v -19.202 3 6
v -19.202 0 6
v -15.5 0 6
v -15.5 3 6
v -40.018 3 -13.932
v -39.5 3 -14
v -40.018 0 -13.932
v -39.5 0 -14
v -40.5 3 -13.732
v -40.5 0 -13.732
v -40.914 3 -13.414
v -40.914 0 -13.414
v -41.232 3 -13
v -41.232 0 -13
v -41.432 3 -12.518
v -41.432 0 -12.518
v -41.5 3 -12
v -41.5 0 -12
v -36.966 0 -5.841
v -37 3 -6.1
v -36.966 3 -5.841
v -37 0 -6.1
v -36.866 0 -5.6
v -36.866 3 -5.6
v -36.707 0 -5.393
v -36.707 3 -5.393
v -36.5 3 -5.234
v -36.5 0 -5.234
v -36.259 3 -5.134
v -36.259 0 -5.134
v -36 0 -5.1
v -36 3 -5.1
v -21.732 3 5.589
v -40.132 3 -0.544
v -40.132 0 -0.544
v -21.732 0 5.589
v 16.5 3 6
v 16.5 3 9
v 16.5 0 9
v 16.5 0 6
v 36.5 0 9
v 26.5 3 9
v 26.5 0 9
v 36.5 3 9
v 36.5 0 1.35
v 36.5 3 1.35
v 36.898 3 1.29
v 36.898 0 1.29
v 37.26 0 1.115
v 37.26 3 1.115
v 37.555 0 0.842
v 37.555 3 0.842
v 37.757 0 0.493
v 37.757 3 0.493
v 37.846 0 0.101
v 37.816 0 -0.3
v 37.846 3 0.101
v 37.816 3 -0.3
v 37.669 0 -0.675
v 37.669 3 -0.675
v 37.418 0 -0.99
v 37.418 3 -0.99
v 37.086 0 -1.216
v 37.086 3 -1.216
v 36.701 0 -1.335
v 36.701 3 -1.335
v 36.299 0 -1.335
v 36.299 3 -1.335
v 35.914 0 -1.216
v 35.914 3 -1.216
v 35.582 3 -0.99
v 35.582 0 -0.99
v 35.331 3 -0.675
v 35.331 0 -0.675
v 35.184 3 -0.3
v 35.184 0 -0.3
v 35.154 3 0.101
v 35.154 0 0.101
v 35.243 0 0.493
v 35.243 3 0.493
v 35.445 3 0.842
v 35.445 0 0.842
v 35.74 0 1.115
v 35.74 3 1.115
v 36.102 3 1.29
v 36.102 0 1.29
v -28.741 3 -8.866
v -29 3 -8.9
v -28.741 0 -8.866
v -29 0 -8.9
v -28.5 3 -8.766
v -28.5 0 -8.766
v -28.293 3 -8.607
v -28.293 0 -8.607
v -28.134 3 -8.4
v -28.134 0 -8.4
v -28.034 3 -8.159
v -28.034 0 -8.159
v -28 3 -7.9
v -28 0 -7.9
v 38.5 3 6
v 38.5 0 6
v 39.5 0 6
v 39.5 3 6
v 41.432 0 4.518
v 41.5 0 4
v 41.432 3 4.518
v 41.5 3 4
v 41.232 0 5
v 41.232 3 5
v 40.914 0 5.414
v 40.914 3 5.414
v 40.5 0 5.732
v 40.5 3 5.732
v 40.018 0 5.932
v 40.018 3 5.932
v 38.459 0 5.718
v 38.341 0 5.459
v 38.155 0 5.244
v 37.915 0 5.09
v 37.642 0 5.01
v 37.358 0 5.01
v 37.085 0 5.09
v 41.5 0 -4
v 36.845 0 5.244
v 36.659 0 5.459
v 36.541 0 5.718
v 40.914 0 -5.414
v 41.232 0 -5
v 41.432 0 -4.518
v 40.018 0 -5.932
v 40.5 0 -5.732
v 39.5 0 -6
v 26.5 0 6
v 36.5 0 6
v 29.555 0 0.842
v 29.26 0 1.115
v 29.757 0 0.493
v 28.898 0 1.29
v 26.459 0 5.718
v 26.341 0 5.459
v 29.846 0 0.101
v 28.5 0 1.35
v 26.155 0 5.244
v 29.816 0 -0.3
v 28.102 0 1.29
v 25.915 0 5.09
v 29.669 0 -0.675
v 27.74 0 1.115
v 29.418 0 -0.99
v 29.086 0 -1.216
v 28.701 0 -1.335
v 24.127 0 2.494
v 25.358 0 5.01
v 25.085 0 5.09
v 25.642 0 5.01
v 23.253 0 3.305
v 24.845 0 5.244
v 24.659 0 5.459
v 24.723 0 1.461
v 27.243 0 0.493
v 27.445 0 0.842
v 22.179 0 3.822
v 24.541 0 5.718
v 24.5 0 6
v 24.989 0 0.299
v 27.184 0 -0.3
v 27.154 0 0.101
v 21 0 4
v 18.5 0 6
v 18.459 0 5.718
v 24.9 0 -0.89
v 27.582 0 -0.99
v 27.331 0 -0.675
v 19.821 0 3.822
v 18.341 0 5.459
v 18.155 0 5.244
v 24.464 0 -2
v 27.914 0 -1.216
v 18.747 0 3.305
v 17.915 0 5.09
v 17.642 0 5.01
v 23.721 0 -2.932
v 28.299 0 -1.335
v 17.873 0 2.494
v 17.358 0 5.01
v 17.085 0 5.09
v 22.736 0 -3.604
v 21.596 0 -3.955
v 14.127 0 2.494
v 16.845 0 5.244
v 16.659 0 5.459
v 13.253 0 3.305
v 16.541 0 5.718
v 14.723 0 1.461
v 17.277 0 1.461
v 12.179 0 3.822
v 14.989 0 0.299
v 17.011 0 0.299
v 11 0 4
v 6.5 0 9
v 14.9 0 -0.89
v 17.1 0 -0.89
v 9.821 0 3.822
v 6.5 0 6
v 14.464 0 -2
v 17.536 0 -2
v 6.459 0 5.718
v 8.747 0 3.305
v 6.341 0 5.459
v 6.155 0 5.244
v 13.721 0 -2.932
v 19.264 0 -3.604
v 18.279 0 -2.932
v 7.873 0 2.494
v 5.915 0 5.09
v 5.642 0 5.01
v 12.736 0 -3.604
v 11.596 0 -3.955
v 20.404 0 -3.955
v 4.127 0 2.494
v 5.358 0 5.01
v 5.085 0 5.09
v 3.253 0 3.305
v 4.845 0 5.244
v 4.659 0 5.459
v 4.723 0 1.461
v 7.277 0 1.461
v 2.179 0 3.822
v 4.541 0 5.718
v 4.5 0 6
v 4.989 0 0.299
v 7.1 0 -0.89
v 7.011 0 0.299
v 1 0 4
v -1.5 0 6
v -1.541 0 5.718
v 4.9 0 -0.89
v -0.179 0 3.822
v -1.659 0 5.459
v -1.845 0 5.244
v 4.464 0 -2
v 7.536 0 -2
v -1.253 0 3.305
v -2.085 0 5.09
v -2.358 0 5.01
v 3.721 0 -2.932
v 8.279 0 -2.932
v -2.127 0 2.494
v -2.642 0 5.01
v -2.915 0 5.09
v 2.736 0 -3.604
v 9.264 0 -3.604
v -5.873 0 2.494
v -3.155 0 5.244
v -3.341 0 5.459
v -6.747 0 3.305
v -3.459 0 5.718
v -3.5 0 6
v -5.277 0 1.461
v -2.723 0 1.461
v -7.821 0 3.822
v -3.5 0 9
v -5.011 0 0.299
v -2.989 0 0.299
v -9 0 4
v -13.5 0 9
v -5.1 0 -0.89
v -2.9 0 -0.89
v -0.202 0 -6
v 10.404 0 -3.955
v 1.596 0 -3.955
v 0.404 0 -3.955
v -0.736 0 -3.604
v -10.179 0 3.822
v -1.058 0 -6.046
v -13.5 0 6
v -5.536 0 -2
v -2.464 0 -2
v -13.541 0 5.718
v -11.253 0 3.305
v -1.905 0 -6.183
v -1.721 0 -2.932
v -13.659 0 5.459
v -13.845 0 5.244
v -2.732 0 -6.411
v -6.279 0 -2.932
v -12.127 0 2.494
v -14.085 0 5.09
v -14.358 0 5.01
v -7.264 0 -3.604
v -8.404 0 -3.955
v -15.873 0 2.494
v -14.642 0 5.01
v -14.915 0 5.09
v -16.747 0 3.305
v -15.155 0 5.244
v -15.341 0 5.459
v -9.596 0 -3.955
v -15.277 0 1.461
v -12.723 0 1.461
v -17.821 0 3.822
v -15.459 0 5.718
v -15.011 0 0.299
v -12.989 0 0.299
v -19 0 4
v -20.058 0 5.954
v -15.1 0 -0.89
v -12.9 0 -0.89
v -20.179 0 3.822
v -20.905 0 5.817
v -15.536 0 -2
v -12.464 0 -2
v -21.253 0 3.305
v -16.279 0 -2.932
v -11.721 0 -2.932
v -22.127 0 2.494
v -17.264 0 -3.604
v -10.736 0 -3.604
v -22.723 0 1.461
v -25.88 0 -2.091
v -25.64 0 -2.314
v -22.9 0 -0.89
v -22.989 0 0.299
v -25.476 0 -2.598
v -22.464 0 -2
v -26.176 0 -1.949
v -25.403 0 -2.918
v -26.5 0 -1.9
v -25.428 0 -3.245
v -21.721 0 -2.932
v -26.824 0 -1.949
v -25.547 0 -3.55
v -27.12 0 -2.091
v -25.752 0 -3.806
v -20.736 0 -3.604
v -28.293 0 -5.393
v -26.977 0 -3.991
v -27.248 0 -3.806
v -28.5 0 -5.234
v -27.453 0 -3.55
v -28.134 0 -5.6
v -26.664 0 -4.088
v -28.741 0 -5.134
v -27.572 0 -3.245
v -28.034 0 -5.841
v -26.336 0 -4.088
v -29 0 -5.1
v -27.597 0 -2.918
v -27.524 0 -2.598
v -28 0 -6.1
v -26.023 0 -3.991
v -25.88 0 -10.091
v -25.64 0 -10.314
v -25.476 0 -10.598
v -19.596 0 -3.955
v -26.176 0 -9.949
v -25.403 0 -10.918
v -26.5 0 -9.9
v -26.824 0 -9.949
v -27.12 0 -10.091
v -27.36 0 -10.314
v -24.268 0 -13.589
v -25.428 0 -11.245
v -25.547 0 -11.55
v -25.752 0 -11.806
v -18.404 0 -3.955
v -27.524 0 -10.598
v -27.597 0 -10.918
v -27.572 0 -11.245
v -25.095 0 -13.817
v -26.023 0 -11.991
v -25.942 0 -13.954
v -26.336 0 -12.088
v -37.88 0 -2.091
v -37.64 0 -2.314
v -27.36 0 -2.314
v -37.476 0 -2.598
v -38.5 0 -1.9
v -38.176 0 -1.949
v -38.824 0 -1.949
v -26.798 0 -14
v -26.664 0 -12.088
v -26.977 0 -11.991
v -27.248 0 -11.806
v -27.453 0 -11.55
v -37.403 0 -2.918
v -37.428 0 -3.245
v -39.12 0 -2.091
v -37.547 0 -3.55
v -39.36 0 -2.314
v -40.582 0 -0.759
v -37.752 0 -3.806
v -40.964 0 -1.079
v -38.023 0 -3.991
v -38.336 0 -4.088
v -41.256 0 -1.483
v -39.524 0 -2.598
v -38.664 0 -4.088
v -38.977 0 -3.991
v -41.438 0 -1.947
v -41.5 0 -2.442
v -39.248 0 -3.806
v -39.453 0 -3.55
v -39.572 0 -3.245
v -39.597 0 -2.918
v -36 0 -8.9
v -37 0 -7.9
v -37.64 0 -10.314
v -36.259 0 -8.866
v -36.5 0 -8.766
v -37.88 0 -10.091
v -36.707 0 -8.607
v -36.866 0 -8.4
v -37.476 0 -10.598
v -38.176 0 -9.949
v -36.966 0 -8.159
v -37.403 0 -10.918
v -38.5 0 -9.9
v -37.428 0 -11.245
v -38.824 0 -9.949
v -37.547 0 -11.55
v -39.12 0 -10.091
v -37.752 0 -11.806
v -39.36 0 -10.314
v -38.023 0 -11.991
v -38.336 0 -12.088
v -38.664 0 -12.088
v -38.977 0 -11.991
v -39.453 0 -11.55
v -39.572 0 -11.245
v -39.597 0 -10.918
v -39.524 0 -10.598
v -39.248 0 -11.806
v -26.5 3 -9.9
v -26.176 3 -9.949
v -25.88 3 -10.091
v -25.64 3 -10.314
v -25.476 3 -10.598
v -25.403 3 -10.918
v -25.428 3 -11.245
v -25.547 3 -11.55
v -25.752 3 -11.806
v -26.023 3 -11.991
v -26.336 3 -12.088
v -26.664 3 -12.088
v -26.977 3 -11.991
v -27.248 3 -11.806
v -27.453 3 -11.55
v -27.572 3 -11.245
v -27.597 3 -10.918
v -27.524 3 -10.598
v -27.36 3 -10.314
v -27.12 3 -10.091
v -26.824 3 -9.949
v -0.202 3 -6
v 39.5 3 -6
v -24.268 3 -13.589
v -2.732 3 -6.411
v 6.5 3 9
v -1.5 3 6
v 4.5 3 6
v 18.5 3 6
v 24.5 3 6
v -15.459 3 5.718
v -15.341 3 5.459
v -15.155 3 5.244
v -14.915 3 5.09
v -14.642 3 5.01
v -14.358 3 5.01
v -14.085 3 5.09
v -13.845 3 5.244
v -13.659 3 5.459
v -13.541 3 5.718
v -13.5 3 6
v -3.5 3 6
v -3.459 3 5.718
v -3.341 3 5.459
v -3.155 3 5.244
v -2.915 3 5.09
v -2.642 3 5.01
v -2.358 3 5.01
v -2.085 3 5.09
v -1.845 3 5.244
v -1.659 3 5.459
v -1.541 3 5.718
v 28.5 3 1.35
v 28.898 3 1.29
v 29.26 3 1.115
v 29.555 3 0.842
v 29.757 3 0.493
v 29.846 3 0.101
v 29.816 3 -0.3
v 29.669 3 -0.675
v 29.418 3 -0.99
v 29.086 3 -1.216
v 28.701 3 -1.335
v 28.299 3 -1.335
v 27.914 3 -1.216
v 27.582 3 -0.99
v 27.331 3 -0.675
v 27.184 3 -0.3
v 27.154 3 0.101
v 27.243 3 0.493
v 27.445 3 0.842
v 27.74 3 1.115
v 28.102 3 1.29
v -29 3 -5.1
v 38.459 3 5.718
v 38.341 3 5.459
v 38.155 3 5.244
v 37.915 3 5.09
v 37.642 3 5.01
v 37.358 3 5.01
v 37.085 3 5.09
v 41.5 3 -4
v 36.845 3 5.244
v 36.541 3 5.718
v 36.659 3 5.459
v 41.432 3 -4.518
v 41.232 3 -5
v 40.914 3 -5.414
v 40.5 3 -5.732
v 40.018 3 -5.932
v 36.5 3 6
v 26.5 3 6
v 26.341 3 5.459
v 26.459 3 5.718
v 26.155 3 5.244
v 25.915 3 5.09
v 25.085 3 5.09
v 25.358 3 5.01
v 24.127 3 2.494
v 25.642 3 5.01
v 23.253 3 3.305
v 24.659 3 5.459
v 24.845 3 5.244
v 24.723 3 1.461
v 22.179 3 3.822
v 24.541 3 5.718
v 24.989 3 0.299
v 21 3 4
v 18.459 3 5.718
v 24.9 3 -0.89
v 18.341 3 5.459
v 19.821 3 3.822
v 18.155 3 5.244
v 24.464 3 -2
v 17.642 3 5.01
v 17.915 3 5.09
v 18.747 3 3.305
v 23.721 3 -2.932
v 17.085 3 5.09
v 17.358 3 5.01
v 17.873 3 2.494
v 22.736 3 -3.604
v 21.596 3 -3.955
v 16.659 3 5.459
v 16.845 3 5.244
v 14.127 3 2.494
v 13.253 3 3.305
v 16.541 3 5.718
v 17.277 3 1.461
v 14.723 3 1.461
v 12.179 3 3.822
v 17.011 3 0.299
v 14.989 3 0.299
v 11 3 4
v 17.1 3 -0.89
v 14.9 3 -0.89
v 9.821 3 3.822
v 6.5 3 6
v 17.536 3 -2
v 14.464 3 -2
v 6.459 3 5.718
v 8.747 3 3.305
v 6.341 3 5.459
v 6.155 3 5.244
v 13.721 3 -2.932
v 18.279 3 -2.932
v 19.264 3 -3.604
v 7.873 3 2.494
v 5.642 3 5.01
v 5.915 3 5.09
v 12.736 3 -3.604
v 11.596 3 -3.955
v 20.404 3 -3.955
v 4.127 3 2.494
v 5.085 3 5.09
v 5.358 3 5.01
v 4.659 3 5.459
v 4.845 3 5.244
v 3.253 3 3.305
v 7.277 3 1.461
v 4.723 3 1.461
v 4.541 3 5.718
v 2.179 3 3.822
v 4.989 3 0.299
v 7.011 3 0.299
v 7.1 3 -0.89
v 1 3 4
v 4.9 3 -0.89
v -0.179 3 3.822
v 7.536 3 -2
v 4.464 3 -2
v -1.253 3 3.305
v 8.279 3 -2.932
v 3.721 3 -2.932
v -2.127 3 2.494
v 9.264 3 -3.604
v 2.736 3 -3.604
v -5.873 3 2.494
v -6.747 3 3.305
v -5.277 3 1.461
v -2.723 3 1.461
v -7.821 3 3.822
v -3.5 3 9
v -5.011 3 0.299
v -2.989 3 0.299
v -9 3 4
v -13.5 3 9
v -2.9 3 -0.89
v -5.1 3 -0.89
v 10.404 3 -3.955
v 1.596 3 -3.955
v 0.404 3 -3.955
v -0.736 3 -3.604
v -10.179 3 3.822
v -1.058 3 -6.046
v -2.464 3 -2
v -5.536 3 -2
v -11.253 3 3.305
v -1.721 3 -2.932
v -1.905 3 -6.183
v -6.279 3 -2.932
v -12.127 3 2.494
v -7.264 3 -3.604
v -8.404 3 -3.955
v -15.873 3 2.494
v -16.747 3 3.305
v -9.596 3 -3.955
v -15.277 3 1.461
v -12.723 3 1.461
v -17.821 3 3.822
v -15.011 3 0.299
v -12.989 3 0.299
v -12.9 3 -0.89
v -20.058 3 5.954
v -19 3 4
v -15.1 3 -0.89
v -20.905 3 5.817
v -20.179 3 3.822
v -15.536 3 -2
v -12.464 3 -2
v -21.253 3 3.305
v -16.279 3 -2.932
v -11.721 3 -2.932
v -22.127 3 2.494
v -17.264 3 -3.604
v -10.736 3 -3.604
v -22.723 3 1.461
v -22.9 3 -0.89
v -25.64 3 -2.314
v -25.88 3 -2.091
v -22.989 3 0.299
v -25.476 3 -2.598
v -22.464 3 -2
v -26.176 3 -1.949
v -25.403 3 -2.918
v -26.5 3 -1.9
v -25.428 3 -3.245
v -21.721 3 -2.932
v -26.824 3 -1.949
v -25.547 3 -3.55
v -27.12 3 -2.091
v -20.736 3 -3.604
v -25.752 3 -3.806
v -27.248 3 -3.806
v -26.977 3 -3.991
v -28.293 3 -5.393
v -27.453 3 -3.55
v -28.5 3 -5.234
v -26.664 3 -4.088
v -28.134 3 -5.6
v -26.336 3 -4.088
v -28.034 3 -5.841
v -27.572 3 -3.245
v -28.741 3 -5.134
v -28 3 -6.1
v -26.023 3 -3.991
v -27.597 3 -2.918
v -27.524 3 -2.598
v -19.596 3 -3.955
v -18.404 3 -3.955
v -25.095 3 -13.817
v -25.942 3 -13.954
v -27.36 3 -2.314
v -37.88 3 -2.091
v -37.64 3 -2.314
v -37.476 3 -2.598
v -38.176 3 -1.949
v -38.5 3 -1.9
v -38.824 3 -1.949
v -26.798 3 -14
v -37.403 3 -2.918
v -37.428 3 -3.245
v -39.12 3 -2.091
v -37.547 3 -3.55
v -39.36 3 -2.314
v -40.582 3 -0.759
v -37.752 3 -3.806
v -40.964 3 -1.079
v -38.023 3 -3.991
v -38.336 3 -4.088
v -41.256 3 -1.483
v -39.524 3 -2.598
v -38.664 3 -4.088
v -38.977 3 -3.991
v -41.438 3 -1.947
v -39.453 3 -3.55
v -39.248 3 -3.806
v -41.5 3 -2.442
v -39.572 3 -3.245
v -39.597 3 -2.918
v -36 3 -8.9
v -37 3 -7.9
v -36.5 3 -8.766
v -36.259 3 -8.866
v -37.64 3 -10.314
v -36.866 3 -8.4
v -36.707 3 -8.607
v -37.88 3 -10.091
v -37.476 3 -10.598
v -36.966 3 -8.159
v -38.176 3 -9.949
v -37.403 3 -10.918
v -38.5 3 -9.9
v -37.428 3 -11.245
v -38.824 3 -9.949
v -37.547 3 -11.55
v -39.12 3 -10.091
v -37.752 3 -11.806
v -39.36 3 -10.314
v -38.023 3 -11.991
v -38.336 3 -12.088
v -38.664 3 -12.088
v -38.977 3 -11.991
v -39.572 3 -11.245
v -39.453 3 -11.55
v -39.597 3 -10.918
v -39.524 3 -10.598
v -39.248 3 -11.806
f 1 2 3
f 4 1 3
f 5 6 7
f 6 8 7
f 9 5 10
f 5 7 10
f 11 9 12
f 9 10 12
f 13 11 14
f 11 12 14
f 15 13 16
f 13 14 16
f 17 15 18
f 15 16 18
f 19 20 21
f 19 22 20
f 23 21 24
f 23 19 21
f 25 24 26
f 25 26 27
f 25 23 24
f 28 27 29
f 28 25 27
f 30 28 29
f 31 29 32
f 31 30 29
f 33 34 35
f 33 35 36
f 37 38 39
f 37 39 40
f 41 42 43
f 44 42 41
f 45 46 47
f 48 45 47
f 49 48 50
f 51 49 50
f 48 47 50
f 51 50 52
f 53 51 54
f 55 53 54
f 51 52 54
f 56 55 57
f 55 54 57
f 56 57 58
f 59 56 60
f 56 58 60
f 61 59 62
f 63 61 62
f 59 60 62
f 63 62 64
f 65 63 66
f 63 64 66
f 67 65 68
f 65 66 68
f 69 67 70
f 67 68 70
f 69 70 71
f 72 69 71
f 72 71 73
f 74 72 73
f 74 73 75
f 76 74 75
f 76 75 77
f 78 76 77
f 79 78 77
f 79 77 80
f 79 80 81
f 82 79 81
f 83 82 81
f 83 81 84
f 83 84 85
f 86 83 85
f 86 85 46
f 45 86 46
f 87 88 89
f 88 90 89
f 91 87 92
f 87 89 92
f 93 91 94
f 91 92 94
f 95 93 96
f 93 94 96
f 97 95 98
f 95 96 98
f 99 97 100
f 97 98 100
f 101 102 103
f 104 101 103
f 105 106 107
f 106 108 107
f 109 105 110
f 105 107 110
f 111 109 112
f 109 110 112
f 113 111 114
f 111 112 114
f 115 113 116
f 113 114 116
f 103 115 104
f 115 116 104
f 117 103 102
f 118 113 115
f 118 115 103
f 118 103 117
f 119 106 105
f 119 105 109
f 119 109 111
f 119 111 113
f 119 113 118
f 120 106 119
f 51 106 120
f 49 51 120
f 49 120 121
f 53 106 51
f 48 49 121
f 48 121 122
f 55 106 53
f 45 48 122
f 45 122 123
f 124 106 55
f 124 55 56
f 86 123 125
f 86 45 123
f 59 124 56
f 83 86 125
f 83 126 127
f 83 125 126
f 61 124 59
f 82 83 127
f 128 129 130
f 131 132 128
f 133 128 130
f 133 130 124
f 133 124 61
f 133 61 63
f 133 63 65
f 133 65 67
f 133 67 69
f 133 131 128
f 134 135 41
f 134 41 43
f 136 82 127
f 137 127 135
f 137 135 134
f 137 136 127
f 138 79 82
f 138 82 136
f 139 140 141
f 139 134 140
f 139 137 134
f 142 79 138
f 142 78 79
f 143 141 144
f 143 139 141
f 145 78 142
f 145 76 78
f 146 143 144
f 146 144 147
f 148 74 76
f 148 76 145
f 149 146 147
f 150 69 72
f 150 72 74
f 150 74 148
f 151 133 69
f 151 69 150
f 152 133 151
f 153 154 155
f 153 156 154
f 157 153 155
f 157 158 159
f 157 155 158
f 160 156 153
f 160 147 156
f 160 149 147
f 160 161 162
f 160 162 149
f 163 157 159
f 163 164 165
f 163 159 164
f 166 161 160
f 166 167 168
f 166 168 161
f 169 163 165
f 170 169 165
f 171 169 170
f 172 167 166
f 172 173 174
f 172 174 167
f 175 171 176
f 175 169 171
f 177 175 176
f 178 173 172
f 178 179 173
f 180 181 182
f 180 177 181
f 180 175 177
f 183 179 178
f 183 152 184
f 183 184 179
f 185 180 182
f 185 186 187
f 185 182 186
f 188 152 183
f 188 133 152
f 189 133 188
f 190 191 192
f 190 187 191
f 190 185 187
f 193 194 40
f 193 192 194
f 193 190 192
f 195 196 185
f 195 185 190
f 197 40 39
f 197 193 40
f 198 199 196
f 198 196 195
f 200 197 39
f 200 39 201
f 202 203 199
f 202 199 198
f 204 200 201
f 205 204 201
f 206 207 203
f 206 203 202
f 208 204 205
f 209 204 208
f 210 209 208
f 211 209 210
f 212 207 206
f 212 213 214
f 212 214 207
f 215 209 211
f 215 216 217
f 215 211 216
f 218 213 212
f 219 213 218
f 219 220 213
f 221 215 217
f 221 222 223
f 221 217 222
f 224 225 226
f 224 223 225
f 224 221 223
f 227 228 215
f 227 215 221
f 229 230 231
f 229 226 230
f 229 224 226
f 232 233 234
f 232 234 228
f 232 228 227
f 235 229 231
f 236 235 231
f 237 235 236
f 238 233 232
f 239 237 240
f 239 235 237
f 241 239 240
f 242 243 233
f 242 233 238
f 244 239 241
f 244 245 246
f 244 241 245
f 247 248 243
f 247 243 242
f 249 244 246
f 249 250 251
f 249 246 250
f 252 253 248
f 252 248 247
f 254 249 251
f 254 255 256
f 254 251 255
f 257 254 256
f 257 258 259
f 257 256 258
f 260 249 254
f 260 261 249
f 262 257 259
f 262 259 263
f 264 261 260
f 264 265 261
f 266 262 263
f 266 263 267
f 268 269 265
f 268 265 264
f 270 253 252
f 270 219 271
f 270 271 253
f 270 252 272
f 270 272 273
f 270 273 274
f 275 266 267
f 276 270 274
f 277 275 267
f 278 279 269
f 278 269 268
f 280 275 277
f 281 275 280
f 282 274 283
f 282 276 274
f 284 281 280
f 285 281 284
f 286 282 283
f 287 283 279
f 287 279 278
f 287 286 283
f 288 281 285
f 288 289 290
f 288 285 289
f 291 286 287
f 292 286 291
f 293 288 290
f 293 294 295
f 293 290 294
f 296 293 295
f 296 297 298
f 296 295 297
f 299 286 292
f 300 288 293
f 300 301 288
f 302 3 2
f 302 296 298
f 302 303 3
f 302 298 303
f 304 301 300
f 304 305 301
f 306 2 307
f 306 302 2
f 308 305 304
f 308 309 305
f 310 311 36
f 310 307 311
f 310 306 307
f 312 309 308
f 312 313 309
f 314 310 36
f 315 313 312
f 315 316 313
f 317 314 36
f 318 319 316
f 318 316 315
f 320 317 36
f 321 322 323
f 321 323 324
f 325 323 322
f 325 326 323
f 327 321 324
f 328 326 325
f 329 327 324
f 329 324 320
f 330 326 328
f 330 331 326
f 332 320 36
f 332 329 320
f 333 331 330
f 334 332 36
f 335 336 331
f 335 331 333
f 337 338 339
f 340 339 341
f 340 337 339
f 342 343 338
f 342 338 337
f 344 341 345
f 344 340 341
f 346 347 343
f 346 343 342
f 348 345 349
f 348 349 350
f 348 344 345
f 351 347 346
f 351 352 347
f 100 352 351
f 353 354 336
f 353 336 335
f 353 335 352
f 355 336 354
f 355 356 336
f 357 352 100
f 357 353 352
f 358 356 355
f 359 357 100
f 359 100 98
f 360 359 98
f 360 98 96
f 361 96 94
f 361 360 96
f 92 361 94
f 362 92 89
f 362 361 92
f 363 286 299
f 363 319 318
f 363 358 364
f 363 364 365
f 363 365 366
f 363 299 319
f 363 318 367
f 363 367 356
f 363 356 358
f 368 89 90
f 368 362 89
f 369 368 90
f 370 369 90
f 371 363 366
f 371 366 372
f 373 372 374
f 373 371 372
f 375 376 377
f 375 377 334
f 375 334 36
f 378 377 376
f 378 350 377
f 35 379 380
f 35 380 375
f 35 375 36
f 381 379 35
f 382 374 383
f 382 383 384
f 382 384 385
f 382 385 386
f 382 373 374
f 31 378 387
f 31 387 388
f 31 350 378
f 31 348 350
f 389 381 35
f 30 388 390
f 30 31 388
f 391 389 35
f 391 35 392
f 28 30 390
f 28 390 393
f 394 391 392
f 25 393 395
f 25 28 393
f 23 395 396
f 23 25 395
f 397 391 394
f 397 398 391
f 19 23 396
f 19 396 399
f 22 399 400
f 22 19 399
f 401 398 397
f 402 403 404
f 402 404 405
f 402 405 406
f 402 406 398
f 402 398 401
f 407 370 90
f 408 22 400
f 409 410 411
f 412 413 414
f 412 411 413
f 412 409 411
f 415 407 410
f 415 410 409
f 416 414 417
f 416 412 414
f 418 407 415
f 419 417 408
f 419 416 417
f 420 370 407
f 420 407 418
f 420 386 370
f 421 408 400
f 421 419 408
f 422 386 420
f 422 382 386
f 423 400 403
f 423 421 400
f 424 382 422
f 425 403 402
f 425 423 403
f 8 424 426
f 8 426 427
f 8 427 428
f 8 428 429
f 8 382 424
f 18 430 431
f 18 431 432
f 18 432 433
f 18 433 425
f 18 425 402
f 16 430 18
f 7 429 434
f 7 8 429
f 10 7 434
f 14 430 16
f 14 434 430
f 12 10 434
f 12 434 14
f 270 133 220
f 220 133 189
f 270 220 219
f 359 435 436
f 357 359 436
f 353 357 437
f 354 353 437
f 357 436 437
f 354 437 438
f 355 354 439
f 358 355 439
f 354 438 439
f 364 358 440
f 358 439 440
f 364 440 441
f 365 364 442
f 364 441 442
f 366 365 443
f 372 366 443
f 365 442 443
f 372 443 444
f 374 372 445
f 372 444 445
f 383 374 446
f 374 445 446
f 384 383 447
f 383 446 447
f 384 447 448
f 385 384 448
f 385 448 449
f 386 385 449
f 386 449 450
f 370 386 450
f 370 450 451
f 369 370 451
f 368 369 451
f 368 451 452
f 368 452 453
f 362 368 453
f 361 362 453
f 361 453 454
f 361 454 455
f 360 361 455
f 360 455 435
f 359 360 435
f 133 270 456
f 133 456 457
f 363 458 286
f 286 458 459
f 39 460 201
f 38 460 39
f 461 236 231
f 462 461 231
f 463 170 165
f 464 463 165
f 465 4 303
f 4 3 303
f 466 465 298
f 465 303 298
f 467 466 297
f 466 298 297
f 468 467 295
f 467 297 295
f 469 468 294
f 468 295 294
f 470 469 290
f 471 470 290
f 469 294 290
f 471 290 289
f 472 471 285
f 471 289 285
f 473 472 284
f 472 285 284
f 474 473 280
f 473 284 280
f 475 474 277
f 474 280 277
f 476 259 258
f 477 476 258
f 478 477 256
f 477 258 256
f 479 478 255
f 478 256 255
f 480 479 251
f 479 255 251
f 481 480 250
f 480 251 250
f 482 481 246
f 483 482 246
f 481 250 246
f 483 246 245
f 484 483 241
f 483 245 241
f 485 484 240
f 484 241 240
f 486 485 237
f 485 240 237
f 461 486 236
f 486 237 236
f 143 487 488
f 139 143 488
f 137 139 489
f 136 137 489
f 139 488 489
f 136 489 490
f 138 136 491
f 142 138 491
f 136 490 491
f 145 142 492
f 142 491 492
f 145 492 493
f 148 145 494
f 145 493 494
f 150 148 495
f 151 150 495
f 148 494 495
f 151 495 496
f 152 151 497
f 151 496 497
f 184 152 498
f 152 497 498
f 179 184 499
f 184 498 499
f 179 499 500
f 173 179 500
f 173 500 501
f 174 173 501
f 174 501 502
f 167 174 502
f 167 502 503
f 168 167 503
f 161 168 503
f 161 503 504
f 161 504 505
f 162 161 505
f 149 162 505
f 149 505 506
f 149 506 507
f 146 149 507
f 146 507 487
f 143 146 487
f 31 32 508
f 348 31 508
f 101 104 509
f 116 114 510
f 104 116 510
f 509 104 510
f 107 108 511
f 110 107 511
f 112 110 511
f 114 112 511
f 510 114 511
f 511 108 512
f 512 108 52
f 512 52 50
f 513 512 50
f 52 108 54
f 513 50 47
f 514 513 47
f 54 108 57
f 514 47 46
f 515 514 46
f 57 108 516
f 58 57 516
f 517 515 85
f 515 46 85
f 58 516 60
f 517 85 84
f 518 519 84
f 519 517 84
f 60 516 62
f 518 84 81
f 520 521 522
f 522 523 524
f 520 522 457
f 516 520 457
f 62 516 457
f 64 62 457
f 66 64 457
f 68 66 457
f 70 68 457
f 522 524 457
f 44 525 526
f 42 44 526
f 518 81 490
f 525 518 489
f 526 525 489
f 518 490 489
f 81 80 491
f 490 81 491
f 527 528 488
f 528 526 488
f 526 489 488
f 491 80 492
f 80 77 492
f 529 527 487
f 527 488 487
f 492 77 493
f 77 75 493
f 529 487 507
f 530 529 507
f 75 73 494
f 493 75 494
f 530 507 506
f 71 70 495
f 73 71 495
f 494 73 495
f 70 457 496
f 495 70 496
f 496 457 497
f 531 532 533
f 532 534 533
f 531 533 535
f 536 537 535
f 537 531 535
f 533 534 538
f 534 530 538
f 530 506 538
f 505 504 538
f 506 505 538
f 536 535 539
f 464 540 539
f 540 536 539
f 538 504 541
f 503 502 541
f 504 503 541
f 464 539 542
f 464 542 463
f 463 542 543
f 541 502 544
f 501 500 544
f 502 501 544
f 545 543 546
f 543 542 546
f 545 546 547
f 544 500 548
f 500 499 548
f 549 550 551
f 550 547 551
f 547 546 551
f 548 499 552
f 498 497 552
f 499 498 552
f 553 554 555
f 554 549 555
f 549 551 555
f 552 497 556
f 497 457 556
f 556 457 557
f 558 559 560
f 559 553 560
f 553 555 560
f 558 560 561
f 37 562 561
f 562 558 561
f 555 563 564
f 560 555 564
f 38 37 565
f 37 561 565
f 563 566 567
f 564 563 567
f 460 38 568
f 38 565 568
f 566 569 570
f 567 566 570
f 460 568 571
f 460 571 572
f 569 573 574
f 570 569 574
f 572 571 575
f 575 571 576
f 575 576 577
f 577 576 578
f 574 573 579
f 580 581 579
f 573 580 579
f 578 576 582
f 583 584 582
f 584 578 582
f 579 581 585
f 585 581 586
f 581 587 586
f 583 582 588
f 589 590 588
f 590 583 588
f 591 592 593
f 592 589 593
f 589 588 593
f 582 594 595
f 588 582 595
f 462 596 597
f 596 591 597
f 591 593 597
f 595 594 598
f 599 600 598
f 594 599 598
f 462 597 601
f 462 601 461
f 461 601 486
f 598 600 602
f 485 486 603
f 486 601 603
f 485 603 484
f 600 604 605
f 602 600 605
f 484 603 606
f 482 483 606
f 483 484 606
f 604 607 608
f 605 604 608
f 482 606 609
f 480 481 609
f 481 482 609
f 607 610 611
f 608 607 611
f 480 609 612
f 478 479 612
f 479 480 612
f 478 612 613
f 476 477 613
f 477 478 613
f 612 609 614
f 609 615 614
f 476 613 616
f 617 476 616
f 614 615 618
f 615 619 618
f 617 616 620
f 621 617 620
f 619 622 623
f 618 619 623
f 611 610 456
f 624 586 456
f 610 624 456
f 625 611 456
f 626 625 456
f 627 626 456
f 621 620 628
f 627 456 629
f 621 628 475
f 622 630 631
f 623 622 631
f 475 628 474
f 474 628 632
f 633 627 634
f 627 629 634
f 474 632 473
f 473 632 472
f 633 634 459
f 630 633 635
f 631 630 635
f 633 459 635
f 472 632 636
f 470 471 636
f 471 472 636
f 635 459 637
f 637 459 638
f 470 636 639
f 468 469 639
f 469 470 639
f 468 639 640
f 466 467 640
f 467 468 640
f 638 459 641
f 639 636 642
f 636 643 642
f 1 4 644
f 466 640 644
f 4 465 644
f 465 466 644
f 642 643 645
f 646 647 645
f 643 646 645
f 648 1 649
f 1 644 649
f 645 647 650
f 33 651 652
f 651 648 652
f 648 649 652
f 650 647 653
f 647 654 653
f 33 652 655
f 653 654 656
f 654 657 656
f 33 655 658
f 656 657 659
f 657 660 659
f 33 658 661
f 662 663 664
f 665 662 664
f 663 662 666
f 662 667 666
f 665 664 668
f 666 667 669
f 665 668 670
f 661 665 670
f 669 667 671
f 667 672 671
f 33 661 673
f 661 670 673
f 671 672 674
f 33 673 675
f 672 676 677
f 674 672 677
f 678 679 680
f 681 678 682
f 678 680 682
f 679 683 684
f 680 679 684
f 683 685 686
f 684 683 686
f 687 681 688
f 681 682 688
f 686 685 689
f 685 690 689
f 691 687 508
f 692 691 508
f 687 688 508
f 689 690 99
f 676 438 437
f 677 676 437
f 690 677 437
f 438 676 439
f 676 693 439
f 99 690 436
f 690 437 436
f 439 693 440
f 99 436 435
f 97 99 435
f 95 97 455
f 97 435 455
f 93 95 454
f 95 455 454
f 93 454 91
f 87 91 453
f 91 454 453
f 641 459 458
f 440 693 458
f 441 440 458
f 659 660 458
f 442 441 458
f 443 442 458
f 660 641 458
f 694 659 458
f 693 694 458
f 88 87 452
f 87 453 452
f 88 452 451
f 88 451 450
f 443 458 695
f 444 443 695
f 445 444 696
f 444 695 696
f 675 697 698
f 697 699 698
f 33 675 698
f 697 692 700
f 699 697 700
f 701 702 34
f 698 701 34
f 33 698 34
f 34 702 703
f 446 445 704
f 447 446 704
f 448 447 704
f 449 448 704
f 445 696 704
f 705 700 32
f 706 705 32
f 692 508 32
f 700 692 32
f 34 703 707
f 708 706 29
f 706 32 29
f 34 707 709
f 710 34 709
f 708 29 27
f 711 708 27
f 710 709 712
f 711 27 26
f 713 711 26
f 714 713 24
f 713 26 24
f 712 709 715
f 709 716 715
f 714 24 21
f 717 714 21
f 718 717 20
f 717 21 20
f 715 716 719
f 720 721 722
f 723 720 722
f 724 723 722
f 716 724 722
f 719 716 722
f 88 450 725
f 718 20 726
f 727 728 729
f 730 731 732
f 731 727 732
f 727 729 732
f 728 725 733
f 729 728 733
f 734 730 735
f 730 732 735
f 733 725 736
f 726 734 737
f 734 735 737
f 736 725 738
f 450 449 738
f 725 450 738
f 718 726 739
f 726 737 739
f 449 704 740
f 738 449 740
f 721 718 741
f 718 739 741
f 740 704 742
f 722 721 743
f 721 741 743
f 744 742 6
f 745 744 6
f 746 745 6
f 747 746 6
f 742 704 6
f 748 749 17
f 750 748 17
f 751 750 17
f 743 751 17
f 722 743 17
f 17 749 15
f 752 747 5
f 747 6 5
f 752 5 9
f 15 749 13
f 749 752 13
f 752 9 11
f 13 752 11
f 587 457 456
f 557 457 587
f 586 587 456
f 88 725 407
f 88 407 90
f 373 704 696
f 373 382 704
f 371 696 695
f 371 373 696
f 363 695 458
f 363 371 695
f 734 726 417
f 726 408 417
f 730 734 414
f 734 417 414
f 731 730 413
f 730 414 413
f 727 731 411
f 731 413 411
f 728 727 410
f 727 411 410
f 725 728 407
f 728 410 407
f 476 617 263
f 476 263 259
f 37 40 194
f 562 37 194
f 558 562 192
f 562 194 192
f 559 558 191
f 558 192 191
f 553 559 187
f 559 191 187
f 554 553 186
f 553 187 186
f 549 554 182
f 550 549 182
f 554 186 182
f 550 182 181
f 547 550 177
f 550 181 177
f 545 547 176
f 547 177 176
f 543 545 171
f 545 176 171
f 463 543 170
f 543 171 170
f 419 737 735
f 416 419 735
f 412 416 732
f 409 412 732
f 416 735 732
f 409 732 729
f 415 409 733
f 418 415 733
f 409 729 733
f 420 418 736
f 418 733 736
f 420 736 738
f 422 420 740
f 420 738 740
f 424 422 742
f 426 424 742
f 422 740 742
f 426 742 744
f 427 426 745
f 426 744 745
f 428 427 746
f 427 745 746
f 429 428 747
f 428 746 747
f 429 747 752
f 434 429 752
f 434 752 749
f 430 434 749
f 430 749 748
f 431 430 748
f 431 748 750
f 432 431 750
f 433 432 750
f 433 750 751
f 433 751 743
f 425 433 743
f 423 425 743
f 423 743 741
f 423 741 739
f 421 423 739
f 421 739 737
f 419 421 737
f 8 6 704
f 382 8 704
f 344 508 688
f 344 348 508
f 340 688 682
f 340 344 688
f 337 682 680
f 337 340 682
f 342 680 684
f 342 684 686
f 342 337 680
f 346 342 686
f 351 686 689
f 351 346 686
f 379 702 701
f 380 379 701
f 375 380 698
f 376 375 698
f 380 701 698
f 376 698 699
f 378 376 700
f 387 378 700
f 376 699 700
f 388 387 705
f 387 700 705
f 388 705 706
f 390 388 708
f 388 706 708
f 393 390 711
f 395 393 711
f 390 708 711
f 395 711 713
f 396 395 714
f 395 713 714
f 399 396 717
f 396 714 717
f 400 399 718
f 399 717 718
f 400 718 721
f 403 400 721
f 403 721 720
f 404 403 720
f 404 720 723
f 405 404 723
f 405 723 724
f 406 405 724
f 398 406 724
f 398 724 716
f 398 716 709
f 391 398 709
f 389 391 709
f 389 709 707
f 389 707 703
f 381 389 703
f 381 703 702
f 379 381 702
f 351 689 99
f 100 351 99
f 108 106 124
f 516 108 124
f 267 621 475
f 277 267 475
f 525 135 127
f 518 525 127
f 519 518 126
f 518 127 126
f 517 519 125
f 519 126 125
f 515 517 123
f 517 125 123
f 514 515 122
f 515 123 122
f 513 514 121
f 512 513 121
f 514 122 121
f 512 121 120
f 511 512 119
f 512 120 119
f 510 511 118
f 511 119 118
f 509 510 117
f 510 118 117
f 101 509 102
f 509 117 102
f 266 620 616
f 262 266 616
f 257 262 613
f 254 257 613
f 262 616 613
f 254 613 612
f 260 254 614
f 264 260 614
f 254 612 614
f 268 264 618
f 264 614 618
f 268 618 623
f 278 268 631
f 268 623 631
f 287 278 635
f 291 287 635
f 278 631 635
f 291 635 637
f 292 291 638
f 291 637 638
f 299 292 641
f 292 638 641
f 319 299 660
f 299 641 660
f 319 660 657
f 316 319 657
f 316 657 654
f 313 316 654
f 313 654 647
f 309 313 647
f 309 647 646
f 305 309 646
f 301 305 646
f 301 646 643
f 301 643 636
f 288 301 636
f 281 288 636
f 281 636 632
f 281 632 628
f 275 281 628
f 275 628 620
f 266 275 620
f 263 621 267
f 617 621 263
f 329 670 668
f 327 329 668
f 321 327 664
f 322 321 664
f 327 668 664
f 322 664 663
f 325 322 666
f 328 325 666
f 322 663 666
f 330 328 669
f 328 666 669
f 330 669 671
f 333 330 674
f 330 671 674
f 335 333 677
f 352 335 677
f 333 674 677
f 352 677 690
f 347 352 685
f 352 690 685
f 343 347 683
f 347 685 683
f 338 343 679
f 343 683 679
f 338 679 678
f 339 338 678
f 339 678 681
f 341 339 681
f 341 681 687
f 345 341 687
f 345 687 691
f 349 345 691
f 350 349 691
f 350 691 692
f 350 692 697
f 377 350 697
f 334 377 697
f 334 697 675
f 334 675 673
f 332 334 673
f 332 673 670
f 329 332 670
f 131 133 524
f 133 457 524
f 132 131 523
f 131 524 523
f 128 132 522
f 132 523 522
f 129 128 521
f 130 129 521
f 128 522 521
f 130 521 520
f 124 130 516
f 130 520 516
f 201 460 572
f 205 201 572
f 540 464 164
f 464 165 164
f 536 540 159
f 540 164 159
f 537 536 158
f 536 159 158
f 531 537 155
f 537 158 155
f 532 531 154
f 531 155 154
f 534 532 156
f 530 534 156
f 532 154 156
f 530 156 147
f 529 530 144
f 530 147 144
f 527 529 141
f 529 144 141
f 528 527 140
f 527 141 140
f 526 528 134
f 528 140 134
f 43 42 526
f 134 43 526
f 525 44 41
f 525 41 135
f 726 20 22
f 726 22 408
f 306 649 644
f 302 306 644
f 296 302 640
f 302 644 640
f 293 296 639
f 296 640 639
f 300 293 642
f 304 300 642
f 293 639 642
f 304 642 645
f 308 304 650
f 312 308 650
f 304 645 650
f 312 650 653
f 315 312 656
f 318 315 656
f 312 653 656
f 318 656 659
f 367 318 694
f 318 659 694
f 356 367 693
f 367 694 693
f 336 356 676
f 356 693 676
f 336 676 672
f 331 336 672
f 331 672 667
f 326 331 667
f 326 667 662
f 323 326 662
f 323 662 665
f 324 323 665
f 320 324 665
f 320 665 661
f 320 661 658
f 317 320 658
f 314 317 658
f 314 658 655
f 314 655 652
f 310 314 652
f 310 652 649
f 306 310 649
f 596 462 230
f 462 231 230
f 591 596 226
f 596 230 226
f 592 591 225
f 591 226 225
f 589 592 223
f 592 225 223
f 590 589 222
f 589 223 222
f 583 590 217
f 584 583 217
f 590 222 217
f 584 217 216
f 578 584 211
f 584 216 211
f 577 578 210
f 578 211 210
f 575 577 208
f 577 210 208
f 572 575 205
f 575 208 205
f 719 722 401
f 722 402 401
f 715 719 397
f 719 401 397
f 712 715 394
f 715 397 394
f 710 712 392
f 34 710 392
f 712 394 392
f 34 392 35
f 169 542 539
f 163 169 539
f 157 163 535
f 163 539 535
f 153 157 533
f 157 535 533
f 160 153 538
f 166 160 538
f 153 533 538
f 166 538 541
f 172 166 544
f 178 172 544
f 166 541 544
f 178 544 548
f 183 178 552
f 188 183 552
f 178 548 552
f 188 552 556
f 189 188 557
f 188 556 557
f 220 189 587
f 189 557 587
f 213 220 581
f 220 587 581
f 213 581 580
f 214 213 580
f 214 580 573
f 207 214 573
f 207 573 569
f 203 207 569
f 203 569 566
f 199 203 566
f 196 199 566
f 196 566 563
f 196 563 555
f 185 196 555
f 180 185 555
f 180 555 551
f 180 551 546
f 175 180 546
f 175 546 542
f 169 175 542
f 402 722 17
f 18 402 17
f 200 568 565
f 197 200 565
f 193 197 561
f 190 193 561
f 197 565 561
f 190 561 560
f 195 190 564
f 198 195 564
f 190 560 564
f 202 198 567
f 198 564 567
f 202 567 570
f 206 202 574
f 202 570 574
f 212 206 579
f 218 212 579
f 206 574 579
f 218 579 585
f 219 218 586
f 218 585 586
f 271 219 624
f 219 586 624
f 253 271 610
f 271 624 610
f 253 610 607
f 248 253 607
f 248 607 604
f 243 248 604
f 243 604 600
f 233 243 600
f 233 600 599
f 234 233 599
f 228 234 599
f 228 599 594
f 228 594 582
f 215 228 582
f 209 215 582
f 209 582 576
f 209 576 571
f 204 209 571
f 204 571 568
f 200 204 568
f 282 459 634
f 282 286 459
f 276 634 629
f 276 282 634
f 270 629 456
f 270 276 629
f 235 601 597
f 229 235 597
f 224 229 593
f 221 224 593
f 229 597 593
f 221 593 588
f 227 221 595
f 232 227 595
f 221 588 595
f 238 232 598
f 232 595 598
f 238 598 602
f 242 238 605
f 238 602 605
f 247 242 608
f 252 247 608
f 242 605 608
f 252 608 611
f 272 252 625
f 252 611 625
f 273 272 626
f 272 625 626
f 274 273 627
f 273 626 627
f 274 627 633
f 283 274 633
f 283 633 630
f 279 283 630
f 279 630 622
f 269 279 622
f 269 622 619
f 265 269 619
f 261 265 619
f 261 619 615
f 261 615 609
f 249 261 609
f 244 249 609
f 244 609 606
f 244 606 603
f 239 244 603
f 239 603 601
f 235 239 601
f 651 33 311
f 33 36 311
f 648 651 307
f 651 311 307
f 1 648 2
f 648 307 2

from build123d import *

# Parameters (mm, degrees)
SKETCH_1_W          = 83
SKETCH_1_H          = 12
EXTRUDE_1_DEPTH     = 3
SKETCH_2_W          = 10
SKETCH_2_H          = 3
EXTRUDE_2_DEPTH     = 3
SKETCH_3_R          = 1
CUT_EXTRUDE_1_DEPTH = 43.570529712
SKETCH_4_R          = 1.35
CUT_EXTRUDE_2_DEPTH = 43.570529712
CUT_EXTRUDE_3_DEPTH = 43.570529712
EXTRUDE_3_DEPTH     = 3
SKETCH_9_R          = 1.1
SKETCH_9_W          = 9
SKETCH_9_H          = 3.8
CUT_EXTRUDE_6_DEPTH = 44.900455579
SKETCH_8_R          = 4
CUT_EXTRUDE_5_DEPTH = 44.900455579
FILLET_1_R          = 8
FILLET_2_R          = 2
FILLET_3_R          = 1


with BuildPart() as part:
    # 草图1 → 凸台-拉伸1 (new body)
    with BuildSketch(Plane(origin=(0, 0, 0), x_dir=(1, 0, 0), z_dir=(0, 1, 0))):
        Rectangle(SKETCH_1_W, SKETCH_1_H)
    extrude(amount=EXTRUDE_1_DEPTH)

    # 草图2 → 凸台-拉伸2 (add)
    with BuildSketch(Plane(origin=(0, 3, 0), x_dir=(1, 0, 0), z_dir=(0, 1, 0))):
        with Locations((11.5, -7.5)):
            Rectangle(SKETCH_2_W, SKETCH_2_H)
        with Locations((-8.5, -7.5)):
            Rectangle(SKETCH_2_W, SKETCH_2_H)
        with Locations((31.5, -7.5)):
            Rectangle(SKETCH_2_W, SKETCH_2_H)
    extrude(amount=-EXTRUDE_2_DEPTH)

    # 草图3 → 切除-拉伸1 (cut, through all)
    with BuildSketch(Plane.XZ):
        with Locations((17.5, 6)):
            Circle(SKETCH_3_R)
        with Locations((5.5, 6)):
            Circle(SKETCH_3_R)
        with Locations((-2.5, 6)):
            Circle(SKETCH_3_R)
        with Locations((-14.5, 6)):
            Circle(SKETCH_3_R)
        with Locations((25.5, 6)):
            Circle(SKETCH_3_R)
        with Locations((37.5, 6)):
            Circle(SKETCH_3_R)
    extrude(amount=-CUT_EXTRUDE_1_DEPTH, mode=Mode.SUBTRACT)

    # 草图4 → 切除-拉伸2 (cut, through all)
    with BuildSketch(Plane(origin=(0, 3, 0), x_dir=(1, 0, 0), z_dir=(0, 1, 0))):
        with Locations(Location((28.5, 0, 0), (0, 0, 270))):
            Circle(SKETCH_4_R)
        with Locations(Location((36.5, 0, 0), (0, 0, 270))):
            Circle(SKETCH_4_R)
    extrude(amount=-CUT_EXTRUDE_2_DEPTH, mode=Mode.SUBTRACT)

    # 草图6 → 切除-拉伸3 (cut, through all)
    with BuildSketch(Plane(origin=(0, 3, 0), x_dir=(1, 0, 0), z_dir=(0, 1, 0))):
        Polygon((-41.5, 1), (-20.5, -6), (-41.5, -6), align=None)
    extrude(amount=-CUT_EXTRUDE_3_DEPTH, mode=Mode.SUBTRACT)

    # 草图5 → 凸台-拉伸3 (add)
    with BuildSketch(Plane(origin=(0, 3, 0), x_dir=(1, 0, 0), z_dir=(0, 1, 0))):
        Polygon((-41.5, 14), (-25.5, 14), (-1.5, 6), (-41.5, 6), align=None)
    extrude(amount=-EXTRUDE_3_DEPTH)

    # 草图9 → 切除-拉伸6 (cut, through all)
    with BuildSketch(Plane(origin=(0, 3, 0), x_dir=(1, 0, 0), z_dir=(0, 1, 0))):
        with Locations(Location((-38.5, 11, 0), (0, 0, 270))):
            Circle(SKETCH_9_R)
        with Locations(Location((-38.5, 3, 0), (0, 0, 270))):
            Circle(SKETCH_9_R)
        with Locations(Location((-26.5, 3, 0), (0, 0, 270))):
            Circle(SKETCH_9_R)
        with Locations(Location((-26.5, 11, 0), (0, 0, 270))):
            Circle(SKETCH_9_R)
        with Locations((-32.5, 7)):
            Rectangle(SKETCH_9_W, SKETCH_9_H)
    extrude(amount=-CUT_EXTRUDE_6_DEPTH, mode=Mode.SUBTRACT)

    # 草图8 → 切除-拉伸5 (cut, through all)
    with BuildSketch(Plane(origin=(0, 3, 0), x_dir=(1, 0, 0), z_dir=(0, 1, 0))):
        with Locations(Location((11, 0, 0), (0, 0, 270))):
            Circle(SKETCH_8_R)
        with Locations(Location((1, 0, 0), (0, 0, 270))):
            Circle(SKETCH_8_R)
        with Locations(Location((-9, 0, 0), (0, 0, 270))):
            Circle(SKETCH_8_R)
        with Locations(Location((-19, 0, 0), (0, 0, 270))):
            Circle(SKETCH_8_R)
        with Locations(Location((21, 0, 0), (0, 0, 270))):
            Circle(SKETCH_8_R)
    extrude(amount=-CUT_EXTRUDE_5_DEPTH, mode=Mode.SUBTRACT)

    # 圆角1
    fillet_1_edges = [part.edges().sort_by_distance(p)[0] for p in [
        (-20.5, 1.5, 6),
        (-25.5, 1.5, -14),
        (-1.5, 1.5, -6),
    ]]
    fillet(fillet_1_edges, radius=FILLET_1_R)

    # 圆角2
    fillet_2_edges = [part.edges().sort_by_distance(p)[0] for p in [
        (-41.5, 1.5, -1),
        (-41.5, 1.5, -14),
        (41.5, 1.5, 6),
        (41.5, 1.5, -6),
    ]]
    fillet(fillet_2_edges, radius=FILLET_2_R)

    # 圆角3
    fillet_3_edges = [part.edges().sort_by_distance(p)[0] for p in [
        (-28, 1.5, -8.9),
        (-28, 1.5, -5.1),
        (-37, 1.5, -5.1),
        (-37, 1.5, -8.9),
    ]]
    fillet(fillet_3_edges, radius=FILLET_3_R)


solid = part.part
